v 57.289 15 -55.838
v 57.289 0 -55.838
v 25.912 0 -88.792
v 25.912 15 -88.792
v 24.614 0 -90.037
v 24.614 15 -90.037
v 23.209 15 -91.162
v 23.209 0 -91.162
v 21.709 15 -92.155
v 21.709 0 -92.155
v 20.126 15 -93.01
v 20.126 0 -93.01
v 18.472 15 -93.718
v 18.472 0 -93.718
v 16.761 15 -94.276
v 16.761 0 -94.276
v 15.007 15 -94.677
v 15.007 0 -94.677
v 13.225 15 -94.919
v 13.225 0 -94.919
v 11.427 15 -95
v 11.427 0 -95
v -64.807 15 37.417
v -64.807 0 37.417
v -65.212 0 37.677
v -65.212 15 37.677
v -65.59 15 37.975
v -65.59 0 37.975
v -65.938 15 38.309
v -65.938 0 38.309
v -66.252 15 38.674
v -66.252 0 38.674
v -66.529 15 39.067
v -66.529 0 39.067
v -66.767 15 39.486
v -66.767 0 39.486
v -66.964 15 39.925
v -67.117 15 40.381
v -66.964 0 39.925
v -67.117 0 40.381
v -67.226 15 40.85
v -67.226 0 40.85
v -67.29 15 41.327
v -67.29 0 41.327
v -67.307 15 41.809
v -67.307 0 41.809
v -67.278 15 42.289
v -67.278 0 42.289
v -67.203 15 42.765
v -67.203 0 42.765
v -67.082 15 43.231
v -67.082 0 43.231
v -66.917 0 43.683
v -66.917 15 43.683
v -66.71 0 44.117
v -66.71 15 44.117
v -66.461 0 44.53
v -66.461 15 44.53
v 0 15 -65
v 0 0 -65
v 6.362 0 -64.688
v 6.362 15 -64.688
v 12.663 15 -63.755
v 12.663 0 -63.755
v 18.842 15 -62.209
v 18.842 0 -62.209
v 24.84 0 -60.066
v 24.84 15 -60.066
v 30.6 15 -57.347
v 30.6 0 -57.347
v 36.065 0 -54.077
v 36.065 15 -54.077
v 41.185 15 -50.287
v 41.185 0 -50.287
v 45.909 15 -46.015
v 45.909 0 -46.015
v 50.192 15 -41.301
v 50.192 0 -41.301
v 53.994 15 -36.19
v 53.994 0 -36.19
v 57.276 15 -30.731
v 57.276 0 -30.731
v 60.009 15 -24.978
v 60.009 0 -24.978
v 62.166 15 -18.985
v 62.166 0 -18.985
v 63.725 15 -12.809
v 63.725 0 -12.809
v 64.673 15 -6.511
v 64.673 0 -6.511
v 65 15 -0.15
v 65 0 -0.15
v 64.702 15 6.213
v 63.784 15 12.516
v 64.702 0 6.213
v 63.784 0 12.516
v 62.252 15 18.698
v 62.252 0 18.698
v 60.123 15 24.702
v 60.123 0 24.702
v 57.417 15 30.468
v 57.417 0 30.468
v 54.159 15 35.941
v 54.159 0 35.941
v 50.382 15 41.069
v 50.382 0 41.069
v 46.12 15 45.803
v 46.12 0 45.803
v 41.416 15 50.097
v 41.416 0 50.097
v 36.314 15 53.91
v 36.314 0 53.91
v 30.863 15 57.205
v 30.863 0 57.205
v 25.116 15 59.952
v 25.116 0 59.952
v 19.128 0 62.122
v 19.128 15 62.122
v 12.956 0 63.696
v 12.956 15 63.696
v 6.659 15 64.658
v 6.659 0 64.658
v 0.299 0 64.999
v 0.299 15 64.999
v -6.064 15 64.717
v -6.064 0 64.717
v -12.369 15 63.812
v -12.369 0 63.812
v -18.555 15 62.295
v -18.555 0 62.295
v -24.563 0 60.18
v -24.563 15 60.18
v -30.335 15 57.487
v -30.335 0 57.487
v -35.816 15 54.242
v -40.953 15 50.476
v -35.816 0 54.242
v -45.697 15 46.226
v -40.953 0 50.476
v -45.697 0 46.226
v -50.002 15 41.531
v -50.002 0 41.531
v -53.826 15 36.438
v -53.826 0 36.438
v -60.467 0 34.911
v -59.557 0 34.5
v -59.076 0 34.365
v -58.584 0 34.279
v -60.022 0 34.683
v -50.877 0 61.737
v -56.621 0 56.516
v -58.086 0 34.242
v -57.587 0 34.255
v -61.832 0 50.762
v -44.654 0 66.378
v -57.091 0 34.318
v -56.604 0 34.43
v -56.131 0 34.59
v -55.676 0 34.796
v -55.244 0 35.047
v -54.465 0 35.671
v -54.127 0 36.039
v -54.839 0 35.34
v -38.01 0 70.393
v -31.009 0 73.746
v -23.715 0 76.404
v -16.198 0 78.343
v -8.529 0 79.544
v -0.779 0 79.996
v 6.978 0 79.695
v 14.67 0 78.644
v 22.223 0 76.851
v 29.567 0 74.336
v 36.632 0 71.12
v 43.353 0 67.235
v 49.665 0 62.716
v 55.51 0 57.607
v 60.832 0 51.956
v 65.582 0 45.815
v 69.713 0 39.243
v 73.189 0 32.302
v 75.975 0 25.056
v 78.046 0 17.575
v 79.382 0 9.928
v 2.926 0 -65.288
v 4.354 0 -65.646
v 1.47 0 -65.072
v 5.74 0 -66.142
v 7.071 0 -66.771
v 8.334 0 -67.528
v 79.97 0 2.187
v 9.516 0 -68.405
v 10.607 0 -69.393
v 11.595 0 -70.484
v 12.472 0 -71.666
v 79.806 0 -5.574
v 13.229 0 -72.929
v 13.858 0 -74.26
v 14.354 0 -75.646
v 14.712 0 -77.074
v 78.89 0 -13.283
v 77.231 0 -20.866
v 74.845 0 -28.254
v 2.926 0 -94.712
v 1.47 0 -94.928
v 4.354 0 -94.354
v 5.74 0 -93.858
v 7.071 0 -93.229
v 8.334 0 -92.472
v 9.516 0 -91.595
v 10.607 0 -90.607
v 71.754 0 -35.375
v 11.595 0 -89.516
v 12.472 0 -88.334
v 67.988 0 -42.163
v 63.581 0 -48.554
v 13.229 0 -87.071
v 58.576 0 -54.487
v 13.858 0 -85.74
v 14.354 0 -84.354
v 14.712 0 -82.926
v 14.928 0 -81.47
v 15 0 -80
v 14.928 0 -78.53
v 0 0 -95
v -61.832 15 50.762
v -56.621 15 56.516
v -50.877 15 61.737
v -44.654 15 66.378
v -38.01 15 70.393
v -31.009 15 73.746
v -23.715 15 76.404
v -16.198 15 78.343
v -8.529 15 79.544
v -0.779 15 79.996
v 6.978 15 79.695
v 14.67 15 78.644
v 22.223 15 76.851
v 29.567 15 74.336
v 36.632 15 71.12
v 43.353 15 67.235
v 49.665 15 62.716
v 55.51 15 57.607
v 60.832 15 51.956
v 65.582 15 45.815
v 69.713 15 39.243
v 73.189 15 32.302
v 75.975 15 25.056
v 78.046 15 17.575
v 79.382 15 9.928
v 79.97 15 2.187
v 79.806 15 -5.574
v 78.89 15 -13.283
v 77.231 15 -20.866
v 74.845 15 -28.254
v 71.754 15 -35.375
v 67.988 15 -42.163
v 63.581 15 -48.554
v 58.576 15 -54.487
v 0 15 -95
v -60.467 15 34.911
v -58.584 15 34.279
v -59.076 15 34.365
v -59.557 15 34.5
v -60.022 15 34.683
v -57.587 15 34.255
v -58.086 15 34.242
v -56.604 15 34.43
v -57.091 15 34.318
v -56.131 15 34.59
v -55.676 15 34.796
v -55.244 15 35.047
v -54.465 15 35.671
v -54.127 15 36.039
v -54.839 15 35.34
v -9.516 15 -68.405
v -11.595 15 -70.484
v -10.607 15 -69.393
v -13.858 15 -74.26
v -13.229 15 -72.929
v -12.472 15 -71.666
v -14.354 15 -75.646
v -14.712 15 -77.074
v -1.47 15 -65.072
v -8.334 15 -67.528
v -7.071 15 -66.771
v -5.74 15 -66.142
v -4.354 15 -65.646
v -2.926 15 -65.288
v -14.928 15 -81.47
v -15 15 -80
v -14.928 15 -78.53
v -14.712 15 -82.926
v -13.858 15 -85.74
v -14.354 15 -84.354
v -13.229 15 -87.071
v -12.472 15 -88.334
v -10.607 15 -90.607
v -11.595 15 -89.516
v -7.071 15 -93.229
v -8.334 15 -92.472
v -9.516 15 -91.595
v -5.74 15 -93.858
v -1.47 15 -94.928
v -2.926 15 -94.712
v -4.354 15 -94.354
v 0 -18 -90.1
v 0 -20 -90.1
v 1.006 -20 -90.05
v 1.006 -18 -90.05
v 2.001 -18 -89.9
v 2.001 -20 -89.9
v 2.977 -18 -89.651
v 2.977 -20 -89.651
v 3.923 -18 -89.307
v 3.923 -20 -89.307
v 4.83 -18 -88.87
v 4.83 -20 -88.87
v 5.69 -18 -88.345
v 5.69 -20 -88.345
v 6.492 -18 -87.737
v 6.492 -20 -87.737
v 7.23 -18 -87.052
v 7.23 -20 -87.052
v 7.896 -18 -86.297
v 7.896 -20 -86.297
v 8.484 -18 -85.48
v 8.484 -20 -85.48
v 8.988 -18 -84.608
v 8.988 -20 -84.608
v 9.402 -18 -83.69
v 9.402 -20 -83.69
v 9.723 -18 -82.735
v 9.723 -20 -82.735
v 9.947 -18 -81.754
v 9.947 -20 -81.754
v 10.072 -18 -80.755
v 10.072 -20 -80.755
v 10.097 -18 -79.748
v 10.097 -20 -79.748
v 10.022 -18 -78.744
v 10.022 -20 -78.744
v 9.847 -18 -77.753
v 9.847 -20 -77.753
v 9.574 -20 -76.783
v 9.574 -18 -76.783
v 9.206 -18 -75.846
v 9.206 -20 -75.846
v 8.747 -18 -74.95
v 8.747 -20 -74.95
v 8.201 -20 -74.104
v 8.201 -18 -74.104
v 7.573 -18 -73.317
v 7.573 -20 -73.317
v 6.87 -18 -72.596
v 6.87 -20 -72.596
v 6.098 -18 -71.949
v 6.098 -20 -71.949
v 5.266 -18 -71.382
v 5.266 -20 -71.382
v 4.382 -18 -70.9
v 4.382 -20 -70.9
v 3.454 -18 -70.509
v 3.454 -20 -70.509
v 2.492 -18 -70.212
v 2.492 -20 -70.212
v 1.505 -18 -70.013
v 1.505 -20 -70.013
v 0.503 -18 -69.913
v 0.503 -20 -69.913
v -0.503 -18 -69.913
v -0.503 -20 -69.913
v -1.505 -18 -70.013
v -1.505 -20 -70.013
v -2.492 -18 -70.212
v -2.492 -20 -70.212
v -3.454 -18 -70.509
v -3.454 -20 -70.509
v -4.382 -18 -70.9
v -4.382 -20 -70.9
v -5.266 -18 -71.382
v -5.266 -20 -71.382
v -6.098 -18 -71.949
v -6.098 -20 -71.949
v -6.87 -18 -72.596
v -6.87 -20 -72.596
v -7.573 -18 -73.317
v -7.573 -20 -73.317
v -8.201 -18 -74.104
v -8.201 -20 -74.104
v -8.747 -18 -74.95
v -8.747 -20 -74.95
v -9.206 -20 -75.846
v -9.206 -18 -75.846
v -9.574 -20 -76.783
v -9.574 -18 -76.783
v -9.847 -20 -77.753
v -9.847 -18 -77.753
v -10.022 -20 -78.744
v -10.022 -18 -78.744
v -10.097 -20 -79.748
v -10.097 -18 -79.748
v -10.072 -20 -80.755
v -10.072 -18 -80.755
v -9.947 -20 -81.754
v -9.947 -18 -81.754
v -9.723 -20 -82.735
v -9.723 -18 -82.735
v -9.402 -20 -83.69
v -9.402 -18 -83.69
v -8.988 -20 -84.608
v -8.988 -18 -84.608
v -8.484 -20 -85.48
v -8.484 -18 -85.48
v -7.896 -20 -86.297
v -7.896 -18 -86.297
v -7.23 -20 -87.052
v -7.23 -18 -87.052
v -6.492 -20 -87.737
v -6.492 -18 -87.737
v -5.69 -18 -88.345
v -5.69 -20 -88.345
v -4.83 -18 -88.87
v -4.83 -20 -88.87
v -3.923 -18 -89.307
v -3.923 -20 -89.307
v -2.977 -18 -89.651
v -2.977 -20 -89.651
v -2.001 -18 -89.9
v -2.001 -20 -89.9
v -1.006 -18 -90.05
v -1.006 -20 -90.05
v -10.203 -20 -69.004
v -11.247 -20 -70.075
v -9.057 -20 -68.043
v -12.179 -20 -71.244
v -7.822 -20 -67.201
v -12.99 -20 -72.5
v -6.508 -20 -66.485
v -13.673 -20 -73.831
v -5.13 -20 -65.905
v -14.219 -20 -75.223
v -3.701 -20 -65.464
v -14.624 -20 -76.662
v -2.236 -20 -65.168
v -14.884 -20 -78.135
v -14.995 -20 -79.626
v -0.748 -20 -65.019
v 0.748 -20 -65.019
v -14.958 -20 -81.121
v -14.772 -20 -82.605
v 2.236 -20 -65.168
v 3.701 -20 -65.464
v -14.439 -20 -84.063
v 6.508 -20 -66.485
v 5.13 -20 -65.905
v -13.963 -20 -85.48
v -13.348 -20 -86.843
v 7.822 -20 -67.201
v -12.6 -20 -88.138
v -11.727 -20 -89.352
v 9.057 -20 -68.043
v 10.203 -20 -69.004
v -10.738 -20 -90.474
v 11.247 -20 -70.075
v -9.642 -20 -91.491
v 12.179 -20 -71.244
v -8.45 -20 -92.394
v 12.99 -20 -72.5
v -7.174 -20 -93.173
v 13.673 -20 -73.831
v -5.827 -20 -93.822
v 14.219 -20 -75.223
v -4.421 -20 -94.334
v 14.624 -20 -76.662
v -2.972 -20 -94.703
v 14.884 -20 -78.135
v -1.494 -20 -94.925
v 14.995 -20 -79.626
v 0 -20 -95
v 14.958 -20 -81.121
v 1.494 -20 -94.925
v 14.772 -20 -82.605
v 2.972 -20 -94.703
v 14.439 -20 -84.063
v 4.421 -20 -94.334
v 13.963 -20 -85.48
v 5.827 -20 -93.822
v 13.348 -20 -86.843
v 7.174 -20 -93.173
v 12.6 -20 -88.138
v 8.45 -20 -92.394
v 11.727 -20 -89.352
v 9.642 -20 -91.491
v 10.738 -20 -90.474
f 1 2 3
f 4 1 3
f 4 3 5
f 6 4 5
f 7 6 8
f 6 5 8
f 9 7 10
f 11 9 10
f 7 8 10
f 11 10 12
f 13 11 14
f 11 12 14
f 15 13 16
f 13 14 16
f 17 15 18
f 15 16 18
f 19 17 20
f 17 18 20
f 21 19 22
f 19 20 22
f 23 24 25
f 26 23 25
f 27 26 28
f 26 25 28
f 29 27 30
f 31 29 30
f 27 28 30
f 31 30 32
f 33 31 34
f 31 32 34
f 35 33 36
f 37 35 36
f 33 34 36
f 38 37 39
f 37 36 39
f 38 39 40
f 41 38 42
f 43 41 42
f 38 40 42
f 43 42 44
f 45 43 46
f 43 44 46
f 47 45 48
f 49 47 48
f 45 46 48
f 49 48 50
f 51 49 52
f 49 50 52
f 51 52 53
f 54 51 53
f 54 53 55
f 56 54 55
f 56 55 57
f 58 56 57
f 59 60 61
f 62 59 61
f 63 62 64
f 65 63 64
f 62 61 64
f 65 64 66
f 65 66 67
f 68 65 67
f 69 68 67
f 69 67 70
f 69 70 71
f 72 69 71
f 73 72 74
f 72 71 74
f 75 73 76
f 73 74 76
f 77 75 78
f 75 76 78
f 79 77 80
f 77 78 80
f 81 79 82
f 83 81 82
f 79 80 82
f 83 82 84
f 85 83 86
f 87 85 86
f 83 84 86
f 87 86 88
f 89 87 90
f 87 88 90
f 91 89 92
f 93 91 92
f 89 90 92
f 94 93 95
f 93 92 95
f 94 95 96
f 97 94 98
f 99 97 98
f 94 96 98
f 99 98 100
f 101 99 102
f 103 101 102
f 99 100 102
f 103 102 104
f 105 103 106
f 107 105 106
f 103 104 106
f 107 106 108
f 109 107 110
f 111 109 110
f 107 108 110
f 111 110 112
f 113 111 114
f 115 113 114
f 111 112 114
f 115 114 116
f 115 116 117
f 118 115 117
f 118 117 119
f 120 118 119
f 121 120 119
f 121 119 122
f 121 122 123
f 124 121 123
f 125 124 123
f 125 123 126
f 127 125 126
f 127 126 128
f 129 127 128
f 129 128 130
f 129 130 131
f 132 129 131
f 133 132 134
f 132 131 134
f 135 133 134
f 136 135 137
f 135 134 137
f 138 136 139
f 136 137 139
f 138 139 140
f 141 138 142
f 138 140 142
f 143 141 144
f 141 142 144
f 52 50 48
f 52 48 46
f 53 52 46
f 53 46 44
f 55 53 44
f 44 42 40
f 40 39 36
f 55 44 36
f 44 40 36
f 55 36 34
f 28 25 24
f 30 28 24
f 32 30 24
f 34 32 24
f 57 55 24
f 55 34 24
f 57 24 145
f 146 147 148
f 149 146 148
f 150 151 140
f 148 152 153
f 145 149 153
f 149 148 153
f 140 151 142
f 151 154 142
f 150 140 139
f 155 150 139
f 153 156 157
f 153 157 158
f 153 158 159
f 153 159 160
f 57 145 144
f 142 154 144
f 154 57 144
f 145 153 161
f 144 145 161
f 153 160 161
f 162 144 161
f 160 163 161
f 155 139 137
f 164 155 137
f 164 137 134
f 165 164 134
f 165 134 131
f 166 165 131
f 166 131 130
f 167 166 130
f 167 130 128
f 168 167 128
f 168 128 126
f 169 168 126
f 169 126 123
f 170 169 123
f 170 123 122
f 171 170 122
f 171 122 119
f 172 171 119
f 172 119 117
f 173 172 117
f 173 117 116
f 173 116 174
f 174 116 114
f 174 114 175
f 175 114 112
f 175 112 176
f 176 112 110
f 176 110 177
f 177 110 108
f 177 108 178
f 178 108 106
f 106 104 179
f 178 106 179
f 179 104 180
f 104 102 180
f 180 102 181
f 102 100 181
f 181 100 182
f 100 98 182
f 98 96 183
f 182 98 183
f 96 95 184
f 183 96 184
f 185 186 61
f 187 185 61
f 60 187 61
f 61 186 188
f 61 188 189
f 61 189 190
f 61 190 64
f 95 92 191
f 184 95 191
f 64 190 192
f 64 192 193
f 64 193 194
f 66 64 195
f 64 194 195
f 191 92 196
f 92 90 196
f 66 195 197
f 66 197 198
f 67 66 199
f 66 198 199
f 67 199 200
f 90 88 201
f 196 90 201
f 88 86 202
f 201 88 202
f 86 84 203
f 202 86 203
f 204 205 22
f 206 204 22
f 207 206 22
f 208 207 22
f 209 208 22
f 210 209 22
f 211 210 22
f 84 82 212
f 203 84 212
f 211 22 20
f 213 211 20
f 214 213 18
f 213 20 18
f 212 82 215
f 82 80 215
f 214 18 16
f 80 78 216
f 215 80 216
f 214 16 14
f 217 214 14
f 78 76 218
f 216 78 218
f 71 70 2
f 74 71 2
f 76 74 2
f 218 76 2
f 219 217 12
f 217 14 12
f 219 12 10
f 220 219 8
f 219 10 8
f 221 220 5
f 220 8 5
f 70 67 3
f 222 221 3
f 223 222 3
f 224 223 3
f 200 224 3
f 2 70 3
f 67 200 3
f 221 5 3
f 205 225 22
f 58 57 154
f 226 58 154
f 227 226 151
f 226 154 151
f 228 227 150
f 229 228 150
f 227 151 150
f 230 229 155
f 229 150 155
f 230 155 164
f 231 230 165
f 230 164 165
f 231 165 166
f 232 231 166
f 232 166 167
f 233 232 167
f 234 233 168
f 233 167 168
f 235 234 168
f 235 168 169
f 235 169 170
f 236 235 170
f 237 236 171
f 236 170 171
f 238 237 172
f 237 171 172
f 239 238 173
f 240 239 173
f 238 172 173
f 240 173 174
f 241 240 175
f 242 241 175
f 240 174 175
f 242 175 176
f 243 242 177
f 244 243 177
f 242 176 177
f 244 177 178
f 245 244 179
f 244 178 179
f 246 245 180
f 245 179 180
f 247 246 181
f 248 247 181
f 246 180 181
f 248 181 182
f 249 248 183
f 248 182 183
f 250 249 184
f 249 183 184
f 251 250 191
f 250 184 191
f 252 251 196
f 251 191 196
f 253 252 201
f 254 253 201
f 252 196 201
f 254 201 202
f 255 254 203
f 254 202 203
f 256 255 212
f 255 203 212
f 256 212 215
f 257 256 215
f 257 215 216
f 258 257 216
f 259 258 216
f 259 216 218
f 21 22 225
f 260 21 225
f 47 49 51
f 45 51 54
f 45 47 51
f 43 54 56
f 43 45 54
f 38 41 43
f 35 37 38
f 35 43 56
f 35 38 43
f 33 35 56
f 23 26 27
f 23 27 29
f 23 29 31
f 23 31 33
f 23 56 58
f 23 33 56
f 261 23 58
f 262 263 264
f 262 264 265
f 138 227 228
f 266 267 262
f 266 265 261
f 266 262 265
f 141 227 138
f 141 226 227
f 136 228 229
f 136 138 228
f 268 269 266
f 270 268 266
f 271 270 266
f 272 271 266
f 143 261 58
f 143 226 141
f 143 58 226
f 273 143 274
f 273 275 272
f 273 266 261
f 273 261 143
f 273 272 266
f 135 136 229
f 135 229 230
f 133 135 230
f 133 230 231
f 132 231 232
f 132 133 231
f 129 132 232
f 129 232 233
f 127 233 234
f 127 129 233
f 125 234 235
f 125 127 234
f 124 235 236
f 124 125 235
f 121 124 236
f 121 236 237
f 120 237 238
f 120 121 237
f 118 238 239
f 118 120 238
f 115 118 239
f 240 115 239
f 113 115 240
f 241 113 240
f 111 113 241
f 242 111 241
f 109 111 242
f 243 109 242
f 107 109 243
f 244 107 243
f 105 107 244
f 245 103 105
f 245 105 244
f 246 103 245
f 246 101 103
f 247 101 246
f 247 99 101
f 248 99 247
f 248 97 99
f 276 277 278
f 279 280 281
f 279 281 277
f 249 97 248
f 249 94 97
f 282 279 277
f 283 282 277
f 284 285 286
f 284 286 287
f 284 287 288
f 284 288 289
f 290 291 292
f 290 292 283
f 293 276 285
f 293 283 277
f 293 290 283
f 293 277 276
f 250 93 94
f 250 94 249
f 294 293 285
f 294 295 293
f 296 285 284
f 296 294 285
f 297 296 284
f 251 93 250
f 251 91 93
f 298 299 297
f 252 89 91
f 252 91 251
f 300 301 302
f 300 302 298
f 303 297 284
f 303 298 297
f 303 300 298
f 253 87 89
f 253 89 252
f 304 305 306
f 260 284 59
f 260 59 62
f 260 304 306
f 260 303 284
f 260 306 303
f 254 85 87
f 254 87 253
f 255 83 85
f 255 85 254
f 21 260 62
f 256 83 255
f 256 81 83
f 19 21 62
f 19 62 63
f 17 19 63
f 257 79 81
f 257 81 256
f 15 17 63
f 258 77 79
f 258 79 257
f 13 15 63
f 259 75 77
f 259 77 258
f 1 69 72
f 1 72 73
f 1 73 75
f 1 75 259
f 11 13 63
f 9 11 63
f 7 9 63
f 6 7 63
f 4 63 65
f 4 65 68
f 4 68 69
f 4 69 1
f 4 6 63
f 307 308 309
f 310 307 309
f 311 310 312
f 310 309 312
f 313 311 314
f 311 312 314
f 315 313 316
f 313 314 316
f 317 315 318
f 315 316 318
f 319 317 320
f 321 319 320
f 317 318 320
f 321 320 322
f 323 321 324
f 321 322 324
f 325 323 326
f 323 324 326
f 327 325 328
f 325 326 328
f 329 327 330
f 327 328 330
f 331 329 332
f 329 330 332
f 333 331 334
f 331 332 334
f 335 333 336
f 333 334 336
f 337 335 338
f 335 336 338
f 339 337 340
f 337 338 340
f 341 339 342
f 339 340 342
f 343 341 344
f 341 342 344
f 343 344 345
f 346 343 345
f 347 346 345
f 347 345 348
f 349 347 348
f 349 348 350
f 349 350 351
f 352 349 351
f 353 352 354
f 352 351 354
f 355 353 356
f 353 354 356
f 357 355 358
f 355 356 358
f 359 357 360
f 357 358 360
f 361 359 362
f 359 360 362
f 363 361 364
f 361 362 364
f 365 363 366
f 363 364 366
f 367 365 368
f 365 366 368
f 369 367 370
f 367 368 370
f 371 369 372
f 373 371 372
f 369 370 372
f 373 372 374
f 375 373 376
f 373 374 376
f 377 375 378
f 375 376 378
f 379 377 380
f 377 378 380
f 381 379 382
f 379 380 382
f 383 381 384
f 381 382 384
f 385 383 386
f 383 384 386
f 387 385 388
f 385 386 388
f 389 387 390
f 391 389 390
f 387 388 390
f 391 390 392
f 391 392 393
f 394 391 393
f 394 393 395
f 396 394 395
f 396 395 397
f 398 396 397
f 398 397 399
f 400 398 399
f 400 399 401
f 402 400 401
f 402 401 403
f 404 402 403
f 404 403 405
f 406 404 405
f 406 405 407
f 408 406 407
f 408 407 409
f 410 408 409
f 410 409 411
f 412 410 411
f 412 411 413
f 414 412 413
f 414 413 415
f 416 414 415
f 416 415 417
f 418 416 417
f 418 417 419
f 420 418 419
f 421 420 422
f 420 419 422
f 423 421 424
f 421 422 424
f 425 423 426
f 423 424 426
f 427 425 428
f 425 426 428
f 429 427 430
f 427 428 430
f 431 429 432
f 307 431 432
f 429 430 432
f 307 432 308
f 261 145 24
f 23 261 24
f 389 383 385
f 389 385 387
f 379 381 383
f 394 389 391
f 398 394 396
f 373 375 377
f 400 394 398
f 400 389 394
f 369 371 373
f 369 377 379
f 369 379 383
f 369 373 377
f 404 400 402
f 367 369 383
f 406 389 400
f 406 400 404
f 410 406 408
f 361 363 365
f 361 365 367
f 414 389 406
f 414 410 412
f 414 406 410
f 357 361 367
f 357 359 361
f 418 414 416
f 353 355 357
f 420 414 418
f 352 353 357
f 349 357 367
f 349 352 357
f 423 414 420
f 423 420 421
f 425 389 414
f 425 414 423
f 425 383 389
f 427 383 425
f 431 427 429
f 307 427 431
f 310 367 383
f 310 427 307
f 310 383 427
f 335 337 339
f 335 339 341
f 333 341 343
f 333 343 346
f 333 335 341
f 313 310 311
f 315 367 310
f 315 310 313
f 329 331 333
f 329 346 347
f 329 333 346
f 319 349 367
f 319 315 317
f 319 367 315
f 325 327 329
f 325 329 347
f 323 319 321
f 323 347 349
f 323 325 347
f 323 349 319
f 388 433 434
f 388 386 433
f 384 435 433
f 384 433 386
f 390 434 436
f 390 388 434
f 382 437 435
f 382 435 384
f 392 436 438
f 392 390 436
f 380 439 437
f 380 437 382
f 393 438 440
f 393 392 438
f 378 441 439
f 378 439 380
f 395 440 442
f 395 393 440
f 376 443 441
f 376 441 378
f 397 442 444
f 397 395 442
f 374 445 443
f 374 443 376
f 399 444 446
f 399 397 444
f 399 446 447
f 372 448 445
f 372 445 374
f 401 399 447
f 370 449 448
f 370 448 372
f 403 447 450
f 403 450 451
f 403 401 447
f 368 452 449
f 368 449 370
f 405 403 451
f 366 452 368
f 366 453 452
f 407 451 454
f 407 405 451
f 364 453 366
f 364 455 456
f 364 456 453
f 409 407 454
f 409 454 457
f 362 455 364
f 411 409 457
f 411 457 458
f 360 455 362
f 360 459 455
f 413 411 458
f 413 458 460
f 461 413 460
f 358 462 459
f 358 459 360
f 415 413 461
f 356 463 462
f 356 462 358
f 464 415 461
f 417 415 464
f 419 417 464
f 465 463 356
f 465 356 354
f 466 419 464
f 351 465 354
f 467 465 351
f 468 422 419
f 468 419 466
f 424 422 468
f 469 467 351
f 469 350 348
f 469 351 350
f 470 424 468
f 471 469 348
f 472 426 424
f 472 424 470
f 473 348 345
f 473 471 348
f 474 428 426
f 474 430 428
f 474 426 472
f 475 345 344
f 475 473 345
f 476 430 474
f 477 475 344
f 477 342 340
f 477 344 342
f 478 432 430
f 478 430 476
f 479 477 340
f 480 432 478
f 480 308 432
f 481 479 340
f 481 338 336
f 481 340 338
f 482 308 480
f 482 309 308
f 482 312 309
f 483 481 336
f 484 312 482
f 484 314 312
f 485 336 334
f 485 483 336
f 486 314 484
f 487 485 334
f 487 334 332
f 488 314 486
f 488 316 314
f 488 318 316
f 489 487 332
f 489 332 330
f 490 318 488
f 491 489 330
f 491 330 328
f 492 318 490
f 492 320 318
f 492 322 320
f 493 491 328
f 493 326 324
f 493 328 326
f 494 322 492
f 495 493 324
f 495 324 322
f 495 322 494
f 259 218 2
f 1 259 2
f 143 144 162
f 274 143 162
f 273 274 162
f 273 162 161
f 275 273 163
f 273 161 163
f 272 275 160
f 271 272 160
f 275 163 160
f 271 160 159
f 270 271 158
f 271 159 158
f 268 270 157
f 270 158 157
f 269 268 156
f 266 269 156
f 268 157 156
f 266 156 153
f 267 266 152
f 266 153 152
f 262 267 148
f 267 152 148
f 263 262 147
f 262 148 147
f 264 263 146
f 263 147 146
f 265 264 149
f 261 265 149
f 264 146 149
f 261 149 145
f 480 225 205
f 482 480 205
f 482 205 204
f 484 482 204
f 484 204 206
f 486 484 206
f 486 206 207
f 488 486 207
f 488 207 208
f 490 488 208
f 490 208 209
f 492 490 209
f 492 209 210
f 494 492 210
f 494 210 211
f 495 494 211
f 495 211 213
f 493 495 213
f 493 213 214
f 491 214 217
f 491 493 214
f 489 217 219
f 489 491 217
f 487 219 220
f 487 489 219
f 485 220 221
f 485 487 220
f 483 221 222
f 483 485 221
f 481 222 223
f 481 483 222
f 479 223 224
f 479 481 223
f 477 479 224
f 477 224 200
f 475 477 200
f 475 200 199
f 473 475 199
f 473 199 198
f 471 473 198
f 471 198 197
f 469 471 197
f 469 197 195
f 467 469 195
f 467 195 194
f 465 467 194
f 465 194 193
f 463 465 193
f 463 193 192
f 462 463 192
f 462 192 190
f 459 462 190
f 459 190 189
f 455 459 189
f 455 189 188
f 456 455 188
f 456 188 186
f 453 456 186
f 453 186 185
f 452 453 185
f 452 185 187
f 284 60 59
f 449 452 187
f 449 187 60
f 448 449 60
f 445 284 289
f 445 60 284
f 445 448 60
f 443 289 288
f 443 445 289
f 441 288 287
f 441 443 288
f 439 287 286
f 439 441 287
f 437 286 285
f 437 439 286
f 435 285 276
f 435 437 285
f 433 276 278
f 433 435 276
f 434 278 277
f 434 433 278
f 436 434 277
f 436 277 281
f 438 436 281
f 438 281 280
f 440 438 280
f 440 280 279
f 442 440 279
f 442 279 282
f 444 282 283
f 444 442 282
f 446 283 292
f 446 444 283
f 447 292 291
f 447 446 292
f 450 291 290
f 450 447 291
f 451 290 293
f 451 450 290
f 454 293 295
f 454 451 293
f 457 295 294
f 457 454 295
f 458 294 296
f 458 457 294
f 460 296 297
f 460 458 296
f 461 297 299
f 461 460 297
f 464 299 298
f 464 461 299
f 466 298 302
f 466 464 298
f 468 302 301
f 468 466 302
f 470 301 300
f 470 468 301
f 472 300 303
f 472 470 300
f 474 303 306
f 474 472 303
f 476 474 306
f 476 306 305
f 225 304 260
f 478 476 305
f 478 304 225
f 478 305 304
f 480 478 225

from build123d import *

# Parameters (mm, degrees)
EXTRUDE_4_DEPTH     = 15
EXTRUDE_START       = 20
SKETCH_4_R          = 15
EXTRUDE_5_DEPTH     = 20
SKETCH_5_R          = 10.1
CUT_EXTRUDE_1_DEPTH = 2


with BuildPart() as part:
    # ｽｹｯﾁ2 → ﾎﾞｽ - 押し出し4 (new body)
    with BuildSketch(Plane(origin=(0, 0, 0), x_dir=(1, 0, 0), z_dir=(0, 1, 0))):
        with BuildLine():
            ThreePointArc((-53.82643789, -36.437818048), (-56.846261527, -34.367935813), (-60.466933112, -34.910600109))
            Line((-60.466933112, -34.910600109), (-64.807406984, -37.416573868))
            ThreePointArc((-64.807406984, -37.416573868), (-67.177509772, -40.614402853), (-66.461234116, -44.529814279))
            ThreePointArc((-66.461234116, -44.529814279), (49.665387485, -62.716419588), (58.57572973, 54.487465409))
            Line((58.57572973, 54.487465409), (57.289371136, 55.838409315))
            Line((57.289371136, 55.838409315), (25.911523347, 88.791671712))
            ThreePointArc((25.911523347, 88.791671712), (19.306695871, 93.382511176), (11.427401304, 95))
            Line((11.427401304, 95), (0, 95))
            ThreePointArc((0, 95), (-15, 80), (0, 65))
            ThreePointArc((0, 65), (57.41714976, -30.467538684), (-53.82643789, -36.437818048))
        make_face()
    extrude(amount=EXTRUDE_4_DEPTH)

    # ｽｹｯﾁ4 → ﾎﾞｽ - 押し出し5 (add)
    with BuildSketch(Plane.XZ.offset(EXTRUDE_START)):
        with Locations(Location((0, -80, 0), (0, 0, 270))):
            Circle(SKETCH_4_R)
    extrude(amount=-EXTRUDE_5_DEPTH)

    # ｽｹｯﾁ5 → ｶｯﾄ - 押し出し1 (cut)
    with BuildSketch(Plane(origin=(0, -20, 0), x_dir=(-1, 0, 0), z_dir=(0, -1, 0))):
        with Locations(Location((0, 80, 0), (0, 0, 90))):
            Circle(SKETCH_5_R)
    extrude(amount=-CUT_EXTRUDE_1_DEPTH, mode=Mode.SUBTRACT)


solid = part.part
